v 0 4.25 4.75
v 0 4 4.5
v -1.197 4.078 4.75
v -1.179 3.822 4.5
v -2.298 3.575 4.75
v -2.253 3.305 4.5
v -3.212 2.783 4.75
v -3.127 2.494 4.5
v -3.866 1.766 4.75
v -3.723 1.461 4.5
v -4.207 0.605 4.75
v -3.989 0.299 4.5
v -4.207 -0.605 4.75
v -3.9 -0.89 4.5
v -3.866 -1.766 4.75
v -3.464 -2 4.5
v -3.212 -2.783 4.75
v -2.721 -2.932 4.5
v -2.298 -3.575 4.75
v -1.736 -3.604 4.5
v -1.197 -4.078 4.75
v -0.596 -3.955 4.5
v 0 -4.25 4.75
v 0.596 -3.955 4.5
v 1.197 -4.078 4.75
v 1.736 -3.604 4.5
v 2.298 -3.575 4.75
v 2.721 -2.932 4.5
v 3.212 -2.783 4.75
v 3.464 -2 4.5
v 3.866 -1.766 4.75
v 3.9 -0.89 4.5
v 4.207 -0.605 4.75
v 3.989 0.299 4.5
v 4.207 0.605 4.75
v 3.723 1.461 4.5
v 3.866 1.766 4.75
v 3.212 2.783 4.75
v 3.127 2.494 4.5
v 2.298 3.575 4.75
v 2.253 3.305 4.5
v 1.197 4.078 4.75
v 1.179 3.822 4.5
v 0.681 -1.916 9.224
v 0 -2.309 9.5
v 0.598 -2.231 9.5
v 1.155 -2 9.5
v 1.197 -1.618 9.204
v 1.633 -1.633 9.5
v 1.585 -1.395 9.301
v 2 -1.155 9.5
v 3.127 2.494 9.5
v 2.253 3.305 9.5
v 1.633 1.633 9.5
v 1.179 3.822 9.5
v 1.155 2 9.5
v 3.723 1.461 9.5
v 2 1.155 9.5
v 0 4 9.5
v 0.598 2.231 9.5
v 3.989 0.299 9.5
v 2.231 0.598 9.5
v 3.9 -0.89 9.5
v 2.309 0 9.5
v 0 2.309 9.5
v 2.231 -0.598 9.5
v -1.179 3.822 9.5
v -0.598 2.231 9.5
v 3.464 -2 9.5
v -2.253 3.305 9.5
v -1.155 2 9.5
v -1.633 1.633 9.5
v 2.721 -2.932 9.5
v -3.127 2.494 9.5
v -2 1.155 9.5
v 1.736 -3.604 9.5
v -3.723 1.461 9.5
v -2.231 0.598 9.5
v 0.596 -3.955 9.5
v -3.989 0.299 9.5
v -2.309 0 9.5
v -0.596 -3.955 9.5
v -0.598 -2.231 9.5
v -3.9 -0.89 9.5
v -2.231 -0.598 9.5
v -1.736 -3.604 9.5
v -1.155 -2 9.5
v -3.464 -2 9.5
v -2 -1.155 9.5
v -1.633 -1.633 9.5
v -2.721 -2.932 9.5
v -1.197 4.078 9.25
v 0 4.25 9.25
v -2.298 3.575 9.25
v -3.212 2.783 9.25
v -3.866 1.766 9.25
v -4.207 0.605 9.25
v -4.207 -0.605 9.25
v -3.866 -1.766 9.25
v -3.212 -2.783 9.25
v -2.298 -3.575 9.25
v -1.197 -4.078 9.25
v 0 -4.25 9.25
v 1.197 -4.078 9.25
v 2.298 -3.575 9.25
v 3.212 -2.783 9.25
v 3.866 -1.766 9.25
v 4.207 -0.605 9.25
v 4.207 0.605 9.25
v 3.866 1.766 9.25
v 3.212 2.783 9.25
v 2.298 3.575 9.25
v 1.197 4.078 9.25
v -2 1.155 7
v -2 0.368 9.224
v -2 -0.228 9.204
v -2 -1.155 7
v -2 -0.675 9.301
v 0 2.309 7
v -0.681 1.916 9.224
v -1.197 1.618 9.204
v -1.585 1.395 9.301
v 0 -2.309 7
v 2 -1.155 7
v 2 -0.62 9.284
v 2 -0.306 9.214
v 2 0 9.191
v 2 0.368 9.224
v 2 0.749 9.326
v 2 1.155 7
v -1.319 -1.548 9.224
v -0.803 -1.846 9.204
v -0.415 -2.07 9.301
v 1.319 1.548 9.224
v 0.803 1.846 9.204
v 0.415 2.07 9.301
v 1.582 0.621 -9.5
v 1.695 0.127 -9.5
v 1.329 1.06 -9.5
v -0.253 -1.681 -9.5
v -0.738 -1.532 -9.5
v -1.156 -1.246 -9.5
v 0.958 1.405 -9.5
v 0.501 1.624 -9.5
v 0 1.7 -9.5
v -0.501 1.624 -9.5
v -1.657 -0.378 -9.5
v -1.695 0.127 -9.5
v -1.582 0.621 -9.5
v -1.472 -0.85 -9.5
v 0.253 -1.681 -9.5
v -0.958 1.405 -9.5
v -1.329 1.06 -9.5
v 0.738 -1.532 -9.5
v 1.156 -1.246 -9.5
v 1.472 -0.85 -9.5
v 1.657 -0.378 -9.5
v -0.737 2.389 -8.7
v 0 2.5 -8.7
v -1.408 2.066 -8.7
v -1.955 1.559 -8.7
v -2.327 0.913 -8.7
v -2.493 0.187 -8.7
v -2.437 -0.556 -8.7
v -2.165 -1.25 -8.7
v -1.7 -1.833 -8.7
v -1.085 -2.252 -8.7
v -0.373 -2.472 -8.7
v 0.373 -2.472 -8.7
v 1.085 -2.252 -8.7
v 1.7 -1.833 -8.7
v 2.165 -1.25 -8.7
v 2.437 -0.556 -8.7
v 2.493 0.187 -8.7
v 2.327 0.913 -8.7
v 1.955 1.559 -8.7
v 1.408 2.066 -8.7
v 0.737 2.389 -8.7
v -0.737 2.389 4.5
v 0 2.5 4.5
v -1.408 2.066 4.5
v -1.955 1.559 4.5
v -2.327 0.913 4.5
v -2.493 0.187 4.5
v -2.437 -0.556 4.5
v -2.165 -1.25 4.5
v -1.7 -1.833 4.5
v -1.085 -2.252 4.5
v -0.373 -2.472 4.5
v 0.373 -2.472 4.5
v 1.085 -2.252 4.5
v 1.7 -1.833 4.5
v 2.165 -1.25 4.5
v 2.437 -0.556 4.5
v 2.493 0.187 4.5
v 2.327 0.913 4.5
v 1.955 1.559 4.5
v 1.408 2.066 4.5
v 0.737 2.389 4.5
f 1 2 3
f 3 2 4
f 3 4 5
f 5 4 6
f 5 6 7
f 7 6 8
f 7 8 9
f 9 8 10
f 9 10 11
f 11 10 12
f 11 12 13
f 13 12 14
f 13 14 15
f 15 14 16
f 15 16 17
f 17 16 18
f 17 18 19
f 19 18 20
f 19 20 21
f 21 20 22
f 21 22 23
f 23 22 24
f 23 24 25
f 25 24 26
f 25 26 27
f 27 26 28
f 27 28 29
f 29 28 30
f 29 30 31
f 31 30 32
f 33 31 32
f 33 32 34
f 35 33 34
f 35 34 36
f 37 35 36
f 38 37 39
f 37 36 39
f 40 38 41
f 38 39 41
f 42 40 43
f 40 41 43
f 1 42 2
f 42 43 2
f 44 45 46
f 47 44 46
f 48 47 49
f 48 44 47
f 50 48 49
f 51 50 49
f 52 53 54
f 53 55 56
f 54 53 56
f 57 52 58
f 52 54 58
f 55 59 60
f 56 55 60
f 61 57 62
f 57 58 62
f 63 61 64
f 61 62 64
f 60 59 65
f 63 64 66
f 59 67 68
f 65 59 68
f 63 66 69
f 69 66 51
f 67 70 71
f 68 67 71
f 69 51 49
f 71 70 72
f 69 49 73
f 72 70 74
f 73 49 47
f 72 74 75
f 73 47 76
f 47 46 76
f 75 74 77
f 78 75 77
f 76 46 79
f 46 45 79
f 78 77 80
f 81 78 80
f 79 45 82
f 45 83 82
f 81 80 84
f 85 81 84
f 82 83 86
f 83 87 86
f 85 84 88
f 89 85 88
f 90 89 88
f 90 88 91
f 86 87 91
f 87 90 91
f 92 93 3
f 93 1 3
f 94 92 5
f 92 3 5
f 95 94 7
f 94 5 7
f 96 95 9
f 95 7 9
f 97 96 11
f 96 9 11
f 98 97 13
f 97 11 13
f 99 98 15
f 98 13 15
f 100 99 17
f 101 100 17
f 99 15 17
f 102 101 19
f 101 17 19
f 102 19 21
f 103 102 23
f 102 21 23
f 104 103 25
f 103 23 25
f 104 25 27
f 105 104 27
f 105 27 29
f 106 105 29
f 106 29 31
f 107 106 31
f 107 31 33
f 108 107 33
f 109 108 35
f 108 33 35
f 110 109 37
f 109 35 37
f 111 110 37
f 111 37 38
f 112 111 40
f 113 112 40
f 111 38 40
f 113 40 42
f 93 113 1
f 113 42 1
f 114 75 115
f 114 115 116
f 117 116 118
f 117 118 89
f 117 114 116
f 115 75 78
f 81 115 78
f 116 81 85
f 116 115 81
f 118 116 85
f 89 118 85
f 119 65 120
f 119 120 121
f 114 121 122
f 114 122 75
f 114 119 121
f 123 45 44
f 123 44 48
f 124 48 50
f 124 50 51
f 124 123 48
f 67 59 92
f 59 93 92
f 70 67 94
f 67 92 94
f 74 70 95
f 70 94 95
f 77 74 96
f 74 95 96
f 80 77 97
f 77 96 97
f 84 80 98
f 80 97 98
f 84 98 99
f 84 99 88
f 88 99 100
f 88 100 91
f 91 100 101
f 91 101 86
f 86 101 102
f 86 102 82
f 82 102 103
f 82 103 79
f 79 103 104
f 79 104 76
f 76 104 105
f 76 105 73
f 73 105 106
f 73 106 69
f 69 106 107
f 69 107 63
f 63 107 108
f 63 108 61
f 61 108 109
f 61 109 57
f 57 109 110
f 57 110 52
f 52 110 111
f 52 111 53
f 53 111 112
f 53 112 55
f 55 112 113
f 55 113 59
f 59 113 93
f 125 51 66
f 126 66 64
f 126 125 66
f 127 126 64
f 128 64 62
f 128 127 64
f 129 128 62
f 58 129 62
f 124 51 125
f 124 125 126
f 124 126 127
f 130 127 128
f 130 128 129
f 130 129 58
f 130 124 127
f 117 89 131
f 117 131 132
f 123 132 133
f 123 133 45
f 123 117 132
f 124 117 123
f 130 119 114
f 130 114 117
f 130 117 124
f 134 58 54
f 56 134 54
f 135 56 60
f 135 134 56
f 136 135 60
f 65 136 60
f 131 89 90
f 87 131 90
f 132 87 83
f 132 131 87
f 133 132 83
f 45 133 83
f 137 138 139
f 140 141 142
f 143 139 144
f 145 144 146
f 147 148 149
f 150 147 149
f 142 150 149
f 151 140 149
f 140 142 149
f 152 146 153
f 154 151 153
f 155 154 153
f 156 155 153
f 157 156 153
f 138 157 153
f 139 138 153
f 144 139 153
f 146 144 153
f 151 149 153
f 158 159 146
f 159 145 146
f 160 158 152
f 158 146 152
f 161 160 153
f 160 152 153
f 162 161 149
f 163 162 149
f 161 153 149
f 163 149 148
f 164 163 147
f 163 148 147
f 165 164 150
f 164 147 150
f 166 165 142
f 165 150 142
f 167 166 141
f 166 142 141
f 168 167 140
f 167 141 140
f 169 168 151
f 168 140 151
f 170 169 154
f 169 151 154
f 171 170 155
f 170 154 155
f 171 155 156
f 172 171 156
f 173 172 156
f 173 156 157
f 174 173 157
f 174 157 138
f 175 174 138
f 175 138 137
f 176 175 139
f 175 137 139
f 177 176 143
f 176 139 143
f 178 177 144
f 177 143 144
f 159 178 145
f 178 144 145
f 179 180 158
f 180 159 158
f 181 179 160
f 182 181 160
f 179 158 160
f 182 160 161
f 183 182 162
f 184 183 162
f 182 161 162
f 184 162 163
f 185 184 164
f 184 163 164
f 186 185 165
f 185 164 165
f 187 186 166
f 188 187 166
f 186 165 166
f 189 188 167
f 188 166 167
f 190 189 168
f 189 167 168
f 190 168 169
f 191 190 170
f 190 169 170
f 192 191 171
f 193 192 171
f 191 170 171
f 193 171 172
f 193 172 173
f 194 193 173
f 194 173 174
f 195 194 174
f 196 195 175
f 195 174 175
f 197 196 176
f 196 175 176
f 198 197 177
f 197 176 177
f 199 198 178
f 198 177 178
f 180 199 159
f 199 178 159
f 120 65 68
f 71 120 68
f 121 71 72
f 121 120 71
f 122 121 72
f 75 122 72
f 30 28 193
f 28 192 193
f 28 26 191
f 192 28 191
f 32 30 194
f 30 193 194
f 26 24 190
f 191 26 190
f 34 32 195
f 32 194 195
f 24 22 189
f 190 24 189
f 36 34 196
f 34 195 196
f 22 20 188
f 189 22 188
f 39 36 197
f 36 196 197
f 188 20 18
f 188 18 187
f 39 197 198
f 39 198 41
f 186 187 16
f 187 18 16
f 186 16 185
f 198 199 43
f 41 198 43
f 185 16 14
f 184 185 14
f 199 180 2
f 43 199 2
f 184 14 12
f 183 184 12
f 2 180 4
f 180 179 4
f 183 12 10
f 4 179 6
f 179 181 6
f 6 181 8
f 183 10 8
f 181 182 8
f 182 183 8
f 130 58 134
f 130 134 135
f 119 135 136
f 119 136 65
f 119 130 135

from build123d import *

# Parameters (mm, degrees)
CUT_EXTRUDE1_START = -2.5
CUT_EXTRUDE1_DEPTH = 2.5
SKETCH4_R          = 2.309401077
CUT_EXTRUDE2_DEPTH = 0.5
CUT_EXTRUDE2_TAPER = 45


with BuildPart() as part:
    # Sketch2 → Revolve1 (revolve)
    with BuildSketch(Plane(origin=(0, 0, 0), x_dir=(0, 0, -1), z_dir=(1, 0, 0))):
        Polygon((-9.25, 4.25), (-4.75, 4.25), (-4.5, 4), (-4.5, 2.5), (8.7, 2.5), (9.5, 1.7), (9.5, 0), (-9.5, 0), (-9.5, 4), align=None)
    revolve(axis=Axis((0, 0, -9.5), (0, 0, 1)))

    # Sketch3 → Cut-Extrude1 (cut)
    with BuildSketch(Plane.XY.offset(9.5).offset(CUT_EXTRUDE1_START)):
        Polygon((0, 2.309401077), (-2, 1.154700538), (-2, -1.154700538), (0, -2.309401077), (2, -1.154700538), (2, 1.154700538), align=None)
    extrude(amount=CUT_EXTRUDE1_DEPTH, mode=Mode.SUBTRACT)

    # Sketch4 → Cut-Extrude2 (cut)
    with BuildSketch(Plane.XY.offset(9.5)):
        Circle(SKETCH4_R)
    extrude(amount=-CUT_EXTRUDE2_DEPTH, taper=CUT_EXTRUDE2_TAPER, mode=Mode.SUBTRACT)


solid = part.part
